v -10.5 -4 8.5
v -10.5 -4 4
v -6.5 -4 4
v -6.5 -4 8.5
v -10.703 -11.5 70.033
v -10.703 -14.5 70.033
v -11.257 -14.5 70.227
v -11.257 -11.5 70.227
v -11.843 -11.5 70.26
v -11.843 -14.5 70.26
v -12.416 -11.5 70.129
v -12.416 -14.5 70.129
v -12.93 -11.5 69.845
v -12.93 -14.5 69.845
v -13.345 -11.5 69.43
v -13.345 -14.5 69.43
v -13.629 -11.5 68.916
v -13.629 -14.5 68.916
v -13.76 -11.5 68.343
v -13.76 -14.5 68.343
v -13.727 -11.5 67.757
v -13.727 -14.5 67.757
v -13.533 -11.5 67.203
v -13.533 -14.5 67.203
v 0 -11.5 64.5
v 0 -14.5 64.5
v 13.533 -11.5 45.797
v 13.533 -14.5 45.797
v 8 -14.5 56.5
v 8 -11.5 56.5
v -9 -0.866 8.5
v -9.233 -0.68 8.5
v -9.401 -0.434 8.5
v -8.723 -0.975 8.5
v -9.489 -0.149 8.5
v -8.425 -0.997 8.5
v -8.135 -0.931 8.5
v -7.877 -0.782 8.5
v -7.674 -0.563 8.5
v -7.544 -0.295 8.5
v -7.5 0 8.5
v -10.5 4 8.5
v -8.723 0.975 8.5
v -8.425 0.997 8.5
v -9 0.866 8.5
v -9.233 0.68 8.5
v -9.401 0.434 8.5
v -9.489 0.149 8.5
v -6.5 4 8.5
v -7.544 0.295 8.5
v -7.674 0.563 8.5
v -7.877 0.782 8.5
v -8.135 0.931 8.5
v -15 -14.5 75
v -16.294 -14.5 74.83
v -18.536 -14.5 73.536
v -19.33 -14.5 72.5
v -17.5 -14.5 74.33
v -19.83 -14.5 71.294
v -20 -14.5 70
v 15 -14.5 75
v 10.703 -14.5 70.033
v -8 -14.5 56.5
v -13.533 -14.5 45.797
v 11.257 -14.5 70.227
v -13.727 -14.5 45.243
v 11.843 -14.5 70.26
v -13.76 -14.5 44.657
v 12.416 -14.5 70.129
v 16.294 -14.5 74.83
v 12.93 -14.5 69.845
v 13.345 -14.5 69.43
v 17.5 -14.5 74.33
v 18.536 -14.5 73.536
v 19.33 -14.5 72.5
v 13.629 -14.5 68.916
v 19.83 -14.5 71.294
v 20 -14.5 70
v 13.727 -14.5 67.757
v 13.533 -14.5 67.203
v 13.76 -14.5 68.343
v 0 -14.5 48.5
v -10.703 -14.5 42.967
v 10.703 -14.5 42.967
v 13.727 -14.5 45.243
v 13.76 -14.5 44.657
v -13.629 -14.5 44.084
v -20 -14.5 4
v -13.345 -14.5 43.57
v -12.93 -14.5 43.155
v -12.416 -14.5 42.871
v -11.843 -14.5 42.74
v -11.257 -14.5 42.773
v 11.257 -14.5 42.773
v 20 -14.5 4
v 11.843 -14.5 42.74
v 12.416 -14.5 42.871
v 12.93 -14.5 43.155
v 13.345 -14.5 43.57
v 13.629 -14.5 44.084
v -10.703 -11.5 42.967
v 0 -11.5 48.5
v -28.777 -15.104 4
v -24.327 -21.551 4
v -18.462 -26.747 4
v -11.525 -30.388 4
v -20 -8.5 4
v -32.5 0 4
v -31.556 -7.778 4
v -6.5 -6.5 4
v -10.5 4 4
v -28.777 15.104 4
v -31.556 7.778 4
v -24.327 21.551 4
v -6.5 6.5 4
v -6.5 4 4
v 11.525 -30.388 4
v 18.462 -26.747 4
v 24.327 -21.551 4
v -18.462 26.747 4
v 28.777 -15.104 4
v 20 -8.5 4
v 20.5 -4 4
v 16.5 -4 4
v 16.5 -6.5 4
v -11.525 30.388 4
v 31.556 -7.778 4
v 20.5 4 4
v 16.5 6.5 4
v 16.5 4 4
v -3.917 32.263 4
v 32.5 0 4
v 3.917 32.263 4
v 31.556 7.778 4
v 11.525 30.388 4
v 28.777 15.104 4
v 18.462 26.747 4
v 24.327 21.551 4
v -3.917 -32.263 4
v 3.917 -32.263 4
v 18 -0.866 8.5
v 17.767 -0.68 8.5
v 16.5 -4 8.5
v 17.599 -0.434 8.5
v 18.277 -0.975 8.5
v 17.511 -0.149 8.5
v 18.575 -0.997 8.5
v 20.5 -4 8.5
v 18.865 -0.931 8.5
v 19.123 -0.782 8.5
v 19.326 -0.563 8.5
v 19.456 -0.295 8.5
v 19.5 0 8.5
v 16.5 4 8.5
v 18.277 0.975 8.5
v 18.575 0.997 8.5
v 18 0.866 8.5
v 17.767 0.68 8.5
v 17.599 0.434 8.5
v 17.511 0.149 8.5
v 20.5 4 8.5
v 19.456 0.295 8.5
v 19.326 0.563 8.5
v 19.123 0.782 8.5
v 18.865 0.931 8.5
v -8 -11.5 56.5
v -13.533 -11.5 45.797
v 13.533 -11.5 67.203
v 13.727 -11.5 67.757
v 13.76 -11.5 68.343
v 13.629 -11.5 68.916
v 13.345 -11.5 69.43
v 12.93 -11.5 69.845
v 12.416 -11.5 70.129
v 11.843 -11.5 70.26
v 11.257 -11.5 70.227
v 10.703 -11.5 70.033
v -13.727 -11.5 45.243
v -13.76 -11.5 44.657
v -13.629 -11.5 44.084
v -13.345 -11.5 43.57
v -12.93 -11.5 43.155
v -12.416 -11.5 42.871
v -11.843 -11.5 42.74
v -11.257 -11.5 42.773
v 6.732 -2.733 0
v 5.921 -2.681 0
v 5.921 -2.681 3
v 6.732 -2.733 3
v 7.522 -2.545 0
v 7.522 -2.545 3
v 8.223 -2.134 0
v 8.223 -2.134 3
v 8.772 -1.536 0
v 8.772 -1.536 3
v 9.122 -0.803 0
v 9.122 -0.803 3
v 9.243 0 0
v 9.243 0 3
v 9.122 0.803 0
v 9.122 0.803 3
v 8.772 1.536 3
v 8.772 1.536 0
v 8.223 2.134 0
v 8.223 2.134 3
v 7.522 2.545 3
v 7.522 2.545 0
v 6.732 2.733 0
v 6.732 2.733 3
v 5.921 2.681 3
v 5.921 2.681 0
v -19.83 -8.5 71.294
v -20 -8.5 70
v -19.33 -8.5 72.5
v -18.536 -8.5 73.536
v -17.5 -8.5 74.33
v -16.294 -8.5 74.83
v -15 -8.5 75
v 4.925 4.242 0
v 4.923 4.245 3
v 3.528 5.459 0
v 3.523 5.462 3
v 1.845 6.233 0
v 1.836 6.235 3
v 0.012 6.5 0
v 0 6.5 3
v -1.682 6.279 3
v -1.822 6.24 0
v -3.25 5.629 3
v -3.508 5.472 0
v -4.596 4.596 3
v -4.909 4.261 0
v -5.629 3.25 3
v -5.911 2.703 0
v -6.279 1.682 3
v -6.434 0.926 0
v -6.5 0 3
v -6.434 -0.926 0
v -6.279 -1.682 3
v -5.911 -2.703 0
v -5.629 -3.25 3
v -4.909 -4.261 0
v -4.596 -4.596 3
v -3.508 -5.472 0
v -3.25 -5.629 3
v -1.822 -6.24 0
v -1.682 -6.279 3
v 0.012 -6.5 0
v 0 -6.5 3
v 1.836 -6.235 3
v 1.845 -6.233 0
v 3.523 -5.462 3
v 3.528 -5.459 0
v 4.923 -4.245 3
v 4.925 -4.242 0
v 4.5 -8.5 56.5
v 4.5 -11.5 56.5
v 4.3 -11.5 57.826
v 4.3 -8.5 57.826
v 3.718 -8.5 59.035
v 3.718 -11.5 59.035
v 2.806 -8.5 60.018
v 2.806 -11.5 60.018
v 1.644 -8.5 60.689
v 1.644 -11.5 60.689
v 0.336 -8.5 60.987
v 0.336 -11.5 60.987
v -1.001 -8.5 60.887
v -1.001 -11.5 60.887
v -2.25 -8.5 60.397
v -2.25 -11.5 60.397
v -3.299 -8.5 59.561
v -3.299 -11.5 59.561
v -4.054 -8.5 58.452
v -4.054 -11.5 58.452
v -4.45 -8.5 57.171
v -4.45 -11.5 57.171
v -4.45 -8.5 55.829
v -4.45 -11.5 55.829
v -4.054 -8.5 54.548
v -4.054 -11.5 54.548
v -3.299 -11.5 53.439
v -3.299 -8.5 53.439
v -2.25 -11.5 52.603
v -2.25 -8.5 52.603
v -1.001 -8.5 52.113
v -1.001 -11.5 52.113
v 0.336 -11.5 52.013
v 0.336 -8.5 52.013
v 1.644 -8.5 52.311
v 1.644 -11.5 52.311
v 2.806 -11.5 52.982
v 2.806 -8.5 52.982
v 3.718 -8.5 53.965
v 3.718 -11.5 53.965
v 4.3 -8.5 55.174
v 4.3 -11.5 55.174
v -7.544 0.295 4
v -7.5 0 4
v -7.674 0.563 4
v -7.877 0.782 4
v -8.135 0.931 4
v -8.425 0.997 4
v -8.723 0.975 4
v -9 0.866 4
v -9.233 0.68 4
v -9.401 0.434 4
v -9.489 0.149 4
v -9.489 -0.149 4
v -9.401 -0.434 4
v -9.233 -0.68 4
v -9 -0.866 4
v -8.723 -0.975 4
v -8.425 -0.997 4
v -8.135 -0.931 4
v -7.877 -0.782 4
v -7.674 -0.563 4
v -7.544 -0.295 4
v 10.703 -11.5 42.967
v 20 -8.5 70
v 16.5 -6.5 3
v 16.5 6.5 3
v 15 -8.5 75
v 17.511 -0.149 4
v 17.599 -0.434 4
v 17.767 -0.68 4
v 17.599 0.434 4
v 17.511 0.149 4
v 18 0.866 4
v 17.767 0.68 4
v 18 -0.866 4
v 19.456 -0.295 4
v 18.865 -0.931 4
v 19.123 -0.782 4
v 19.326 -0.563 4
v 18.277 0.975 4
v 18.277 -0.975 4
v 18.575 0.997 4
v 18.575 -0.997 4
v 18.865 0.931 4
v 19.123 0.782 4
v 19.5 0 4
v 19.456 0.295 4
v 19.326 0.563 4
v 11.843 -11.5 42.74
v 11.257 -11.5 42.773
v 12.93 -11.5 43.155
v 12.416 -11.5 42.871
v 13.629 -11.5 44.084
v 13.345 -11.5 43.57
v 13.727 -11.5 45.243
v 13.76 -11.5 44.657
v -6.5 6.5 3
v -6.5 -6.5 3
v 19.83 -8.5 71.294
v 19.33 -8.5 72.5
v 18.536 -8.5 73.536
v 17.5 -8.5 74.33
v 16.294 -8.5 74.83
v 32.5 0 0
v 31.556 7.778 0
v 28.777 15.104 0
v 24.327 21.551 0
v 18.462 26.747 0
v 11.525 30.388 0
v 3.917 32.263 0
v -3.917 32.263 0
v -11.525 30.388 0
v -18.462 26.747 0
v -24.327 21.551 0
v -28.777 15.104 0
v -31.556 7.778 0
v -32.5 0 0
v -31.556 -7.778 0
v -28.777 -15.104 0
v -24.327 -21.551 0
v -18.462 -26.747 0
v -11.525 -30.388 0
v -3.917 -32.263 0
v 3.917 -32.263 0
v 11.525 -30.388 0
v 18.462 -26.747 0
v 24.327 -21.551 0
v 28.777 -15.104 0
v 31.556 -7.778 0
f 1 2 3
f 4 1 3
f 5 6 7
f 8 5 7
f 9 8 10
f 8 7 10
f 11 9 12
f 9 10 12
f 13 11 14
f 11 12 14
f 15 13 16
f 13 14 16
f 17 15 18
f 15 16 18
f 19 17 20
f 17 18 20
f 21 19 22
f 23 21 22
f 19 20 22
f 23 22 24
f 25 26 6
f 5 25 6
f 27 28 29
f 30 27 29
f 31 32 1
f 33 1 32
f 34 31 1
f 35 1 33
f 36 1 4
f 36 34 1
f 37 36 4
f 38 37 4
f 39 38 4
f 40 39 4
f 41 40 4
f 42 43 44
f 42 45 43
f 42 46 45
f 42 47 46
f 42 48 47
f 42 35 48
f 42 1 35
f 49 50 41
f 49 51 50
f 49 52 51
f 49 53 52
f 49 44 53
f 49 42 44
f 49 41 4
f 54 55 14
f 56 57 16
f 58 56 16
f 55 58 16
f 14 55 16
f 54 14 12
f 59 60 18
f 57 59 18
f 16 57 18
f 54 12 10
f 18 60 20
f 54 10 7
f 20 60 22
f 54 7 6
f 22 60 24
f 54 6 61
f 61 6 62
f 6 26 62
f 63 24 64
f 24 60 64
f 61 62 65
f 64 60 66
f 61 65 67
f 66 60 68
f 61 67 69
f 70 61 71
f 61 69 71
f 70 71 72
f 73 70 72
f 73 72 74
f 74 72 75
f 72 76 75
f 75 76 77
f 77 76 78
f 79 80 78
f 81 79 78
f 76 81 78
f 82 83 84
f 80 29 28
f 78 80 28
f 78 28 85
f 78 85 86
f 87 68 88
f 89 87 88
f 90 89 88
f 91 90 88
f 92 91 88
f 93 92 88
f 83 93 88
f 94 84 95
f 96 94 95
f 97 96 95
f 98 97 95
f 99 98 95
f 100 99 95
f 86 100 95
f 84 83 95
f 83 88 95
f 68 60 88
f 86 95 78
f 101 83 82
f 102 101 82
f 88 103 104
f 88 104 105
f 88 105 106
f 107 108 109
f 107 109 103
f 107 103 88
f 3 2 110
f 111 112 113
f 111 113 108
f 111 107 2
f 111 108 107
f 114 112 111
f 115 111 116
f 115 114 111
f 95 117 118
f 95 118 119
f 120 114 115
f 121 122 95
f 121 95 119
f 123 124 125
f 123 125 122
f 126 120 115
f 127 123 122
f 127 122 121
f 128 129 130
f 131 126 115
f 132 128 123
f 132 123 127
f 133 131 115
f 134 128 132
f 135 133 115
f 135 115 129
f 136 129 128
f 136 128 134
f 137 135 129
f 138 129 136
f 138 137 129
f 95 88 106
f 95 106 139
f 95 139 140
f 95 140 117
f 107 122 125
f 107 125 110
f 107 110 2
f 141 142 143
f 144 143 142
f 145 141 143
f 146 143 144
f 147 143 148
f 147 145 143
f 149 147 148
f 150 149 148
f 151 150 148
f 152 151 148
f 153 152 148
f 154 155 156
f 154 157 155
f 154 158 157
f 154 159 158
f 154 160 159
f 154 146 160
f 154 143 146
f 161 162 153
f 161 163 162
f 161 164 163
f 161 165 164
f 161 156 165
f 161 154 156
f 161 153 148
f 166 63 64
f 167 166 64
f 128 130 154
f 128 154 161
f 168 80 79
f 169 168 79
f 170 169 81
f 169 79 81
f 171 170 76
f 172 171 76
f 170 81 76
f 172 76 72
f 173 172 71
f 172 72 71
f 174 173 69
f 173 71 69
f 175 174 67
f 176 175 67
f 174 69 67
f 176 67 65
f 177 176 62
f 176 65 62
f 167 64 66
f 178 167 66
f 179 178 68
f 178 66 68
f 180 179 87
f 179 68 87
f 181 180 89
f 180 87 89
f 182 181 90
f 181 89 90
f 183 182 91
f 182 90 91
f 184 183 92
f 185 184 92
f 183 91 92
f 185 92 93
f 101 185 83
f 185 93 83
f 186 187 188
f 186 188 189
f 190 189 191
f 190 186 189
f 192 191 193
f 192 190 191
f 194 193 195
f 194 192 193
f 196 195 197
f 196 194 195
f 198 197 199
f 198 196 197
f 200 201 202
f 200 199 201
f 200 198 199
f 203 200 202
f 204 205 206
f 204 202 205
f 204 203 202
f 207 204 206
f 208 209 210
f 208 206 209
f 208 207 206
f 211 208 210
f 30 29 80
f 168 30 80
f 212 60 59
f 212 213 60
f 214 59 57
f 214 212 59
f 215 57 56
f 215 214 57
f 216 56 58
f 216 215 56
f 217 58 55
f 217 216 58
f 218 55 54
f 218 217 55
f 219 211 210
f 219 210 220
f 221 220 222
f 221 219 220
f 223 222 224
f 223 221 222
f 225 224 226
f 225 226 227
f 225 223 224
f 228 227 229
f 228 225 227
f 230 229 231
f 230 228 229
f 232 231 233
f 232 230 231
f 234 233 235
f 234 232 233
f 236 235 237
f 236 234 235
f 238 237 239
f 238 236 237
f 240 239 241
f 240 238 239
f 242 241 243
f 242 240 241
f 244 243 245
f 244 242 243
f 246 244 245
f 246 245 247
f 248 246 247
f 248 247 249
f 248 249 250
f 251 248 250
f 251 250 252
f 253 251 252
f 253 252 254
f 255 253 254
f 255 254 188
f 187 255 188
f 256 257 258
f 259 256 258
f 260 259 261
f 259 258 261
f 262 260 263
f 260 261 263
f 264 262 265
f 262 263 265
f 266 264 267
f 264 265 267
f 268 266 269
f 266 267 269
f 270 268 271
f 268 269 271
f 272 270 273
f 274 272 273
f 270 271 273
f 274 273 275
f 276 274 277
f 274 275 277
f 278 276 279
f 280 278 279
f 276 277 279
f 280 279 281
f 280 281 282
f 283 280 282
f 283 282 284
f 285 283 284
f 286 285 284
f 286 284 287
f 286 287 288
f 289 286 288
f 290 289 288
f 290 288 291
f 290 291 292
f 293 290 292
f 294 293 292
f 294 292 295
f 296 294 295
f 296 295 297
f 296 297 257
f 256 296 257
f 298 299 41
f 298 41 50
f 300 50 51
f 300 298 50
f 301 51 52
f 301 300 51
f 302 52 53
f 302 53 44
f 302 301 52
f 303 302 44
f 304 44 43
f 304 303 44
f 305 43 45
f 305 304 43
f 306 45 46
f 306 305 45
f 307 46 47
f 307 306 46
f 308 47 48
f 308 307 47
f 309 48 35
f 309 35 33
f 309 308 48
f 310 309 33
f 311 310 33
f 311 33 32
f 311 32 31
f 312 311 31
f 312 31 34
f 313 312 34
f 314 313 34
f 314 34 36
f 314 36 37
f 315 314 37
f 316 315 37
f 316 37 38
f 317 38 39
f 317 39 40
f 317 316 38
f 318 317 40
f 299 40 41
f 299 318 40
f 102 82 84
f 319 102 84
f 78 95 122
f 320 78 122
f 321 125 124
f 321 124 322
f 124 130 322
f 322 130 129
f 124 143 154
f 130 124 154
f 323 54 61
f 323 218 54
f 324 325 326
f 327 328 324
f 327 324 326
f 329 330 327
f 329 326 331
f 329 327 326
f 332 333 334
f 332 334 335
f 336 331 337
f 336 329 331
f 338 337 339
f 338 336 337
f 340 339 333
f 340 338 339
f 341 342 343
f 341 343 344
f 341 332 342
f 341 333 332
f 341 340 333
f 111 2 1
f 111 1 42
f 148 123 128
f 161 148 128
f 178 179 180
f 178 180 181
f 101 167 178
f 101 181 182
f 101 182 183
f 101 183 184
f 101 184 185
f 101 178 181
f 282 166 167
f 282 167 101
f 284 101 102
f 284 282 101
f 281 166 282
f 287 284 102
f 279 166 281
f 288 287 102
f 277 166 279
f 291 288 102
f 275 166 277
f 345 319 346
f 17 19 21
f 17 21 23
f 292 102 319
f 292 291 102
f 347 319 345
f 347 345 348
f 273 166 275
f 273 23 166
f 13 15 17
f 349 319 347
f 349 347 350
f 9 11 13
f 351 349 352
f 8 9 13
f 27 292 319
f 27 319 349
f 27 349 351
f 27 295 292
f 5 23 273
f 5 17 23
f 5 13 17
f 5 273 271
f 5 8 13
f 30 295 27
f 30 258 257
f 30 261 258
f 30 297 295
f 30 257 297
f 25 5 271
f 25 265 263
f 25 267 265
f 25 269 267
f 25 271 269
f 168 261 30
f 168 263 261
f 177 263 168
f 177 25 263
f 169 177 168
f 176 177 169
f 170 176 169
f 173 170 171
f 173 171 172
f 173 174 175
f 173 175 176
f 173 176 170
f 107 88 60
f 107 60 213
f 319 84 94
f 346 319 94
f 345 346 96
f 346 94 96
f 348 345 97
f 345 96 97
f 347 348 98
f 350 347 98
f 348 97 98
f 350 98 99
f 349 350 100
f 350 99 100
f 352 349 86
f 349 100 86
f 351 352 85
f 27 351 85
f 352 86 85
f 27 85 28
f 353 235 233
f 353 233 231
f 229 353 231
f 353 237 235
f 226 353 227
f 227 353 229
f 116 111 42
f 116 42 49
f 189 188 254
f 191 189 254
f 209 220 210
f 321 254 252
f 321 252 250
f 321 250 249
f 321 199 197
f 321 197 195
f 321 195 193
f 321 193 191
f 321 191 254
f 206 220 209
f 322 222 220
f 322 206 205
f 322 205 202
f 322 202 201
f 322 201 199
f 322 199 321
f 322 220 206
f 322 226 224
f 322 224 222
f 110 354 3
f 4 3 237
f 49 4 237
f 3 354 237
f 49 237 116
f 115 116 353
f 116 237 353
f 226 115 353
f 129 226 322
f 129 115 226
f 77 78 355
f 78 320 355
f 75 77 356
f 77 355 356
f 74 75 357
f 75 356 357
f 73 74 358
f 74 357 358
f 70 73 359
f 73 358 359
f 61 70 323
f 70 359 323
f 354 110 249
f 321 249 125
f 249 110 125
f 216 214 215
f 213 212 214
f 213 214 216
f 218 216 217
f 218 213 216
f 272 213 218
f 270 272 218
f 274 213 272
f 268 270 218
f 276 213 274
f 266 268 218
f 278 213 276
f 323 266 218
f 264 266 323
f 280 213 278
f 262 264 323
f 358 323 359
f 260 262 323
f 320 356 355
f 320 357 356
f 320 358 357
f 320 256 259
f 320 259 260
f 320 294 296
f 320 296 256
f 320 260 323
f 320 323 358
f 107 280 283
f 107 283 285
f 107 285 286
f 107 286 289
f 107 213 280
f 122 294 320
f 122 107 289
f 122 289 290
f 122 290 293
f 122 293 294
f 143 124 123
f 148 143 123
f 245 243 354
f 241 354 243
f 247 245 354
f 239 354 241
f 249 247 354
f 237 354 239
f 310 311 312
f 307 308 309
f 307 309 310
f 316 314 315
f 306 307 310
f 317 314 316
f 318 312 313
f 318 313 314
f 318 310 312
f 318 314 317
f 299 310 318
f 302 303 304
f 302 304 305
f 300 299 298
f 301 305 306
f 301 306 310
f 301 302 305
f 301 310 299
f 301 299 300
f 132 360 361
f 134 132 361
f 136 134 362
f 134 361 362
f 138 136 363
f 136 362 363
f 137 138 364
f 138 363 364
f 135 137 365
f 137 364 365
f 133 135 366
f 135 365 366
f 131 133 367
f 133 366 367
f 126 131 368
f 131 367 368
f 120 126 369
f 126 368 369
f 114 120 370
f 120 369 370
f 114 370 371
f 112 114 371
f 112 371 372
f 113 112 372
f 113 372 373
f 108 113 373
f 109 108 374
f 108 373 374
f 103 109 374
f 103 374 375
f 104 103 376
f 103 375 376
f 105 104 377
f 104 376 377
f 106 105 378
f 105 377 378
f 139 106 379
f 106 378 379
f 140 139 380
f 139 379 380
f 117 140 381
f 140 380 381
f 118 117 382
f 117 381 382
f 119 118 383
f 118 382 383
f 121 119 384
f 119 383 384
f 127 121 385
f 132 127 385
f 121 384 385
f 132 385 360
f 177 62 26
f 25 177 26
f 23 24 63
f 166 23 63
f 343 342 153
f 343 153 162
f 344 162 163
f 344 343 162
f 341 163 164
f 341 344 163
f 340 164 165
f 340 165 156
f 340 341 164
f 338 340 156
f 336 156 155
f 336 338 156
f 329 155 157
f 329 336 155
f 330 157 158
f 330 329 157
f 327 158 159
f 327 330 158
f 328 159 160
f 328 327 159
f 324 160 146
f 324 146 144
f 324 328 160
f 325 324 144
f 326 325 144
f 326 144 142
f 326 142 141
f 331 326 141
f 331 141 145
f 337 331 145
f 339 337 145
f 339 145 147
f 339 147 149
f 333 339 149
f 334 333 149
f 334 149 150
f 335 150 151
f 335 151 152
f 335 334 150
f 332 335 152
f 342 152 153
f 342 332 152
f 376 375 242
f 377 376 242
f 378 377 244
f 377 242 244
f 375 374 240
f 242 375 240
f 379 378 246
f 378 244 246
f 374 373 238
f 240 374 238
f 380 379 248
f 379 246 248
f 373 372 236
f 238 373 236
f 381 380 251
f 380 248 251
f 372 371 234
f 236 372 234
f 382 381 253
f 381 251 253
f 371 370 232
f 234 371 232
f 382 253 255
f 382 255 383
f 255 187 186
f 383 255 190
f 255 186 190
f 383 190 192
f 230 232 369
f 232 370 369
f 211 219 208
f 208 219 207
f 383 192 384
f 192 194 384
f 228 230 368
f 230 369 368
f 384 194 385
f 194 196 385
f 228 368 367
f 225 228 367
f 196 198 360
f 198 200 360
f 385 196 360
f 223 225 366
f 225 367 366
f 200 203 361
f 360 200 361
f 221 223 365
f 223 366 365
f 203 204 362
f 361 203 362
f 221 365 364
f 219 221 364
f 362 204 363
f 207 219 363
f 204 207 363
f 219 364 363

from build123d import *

# Parameters (mm, degrees)
ESBO_O1_R                = 32.5
RESSALTO_EXTRUS_O1_DEPTH = 4
ESBO_O2_W                = 4
ESBO_O2_H                = 8
ESBO_O2_R                = 1
RESSALTO_EXTRUS_O3_DEPTH = 4.5
ESBO_O3_W                = 23
ESBO_O3_H                = 13
CORTE_EXTRUS_O1_DEPTH    = 1
ESBO_O4_W                = 40
ESBO_O4_H                = 6
RESSALTO_EXTRUS_O4_DEPTH = 71
ESBO_O5_R                = 4.5
CORTE_EXTRUS_O2_DEPTH    = 61
CORTE_EXTRUS_O3_DEPTH    = 3
FILETE1_R                = 5


with BuildPart() as part:
    # Esboço1 → Ressalto-extrusão1 (new body)
    with BuildSketch(Plane.XY):
        Circle(ESBO_O1_R)
        with BuildLine():
            ThreePointArc((5.921389022, 2.680886429), (-6.5, 0), (5.921389022, -2.680886429))
            ThreePointArc((5.921389022, -2.680886429), (9.242616034, 0), (5.921389022, 2.680886429))
        make_face(mode=Mode.SUBTRACT)
    extrude(amount=RESSALTO_EXTRUS_O1_DEPTH)

    # Esboço2 → Ressalto-extrusão3 (add)
    with BuildSketch(Plane.XY.offset(4)):
        with Locations((-8.5, 0)):
            Rectangle(ESBO_O2_W, ESBO_O2_H)
        with Locations((-8.5, 0)):
            Circle(ESBO_O2_R, mode=Mode.SUBTRACT)
        with Locations((18.5, 0)):
            Rectangle(ESBO_O2_W, ESBO_O2_H)
        with Locations((18.5, 0)):
            Circle(ESBO_O2_R, mode=Mode.SUBTRACT)
    extrude(amount=RESSALTO_EXTRUS_O3_DEPTH)

    # Esboço3 → Corte-extrusão1 (cut)
    with BuildSketch(Plane.XY.offset(4)):
        with Locations((5, 0)):
            Rectangle(ESBO_O3_W, ESBO_O3_H)
    extrude(amount=-CORTE_EXTRUS_O1_DEPTH, mode=Mode.SUBTRACT)

    # Esboço4 → Ressalto-extrusão4 (add)
    with BuildSketch(Plane.XY.offset(4)):
        with Locations((0, -11.5)):
            Rectangle(ESBO_O4_W, ESBO_O4_H)
    extrude(amount=RESSALTO_EXTRUS_O4_DEPTH)

    # Esboço5 → Corte-extrusão2 (cut)
    with BuildSketch(Plane.XZ.offset(14.5)):
        with Locations((0, 56.5)):
            Circle(ESBO_O5_R)
    extrude(amount=-CORTE_EXTRUS_O2_DEPTH, mode=Mode.SUBTRACT)

    # Esboço6 → Corte-extrusão3 (cut)
    with BuildSketch(Plane.XZ.offset(14.5)):
        with BuildLine():
            Line((0, 64.5), (-10.70310615, 70.032504242))
            ThreePointArc((-10.70310615, 70.032504242), (-13.151971512, 69.651971512), (-13.532504242, 67.20310615))
            Line((-13.532504242, 67.20310615), (-8, 56.5))
            Line((-8, 56.5), (-13.532504242, 45.79689385))
            ThreePointArc((-13.532504242, 45.79689385), (-13.151971512, 43.348028488), (-10.70310615, 42.967495758))
            Line((-10.70310615, 42.967495758), (0, 48.5))
            Line((0, 48.5), (10.70310615, 42.967495758))
            ThreePointArc((10.70310615, 42.967495758), (13.151971512, 43.348028488), (13.532504242, 45.79689385))
            Line((13.532504242, 45.79689385), (8, 56.5))
            Line((8, 56.5), (13.532504242, 67.20310615))
            ThreePointArc((13.532504242, 67.20310615), (13.151971512, 69.651971512), (10.70310615, 70.032504242))
            Line((10.70310615, 70.032504242), (0, 64.5))
        make_face()
    extrude(amount=-CORTE_EXTRUS_O3_DEPTH, mode=Mode.SUBTRACT)

    # Filete1
    filete1_edges = [part.edges().sort_by_distance(p)[0] for p in [
        (20, -11.5, 75),
        (-20, -11.5, 75),
    ]]
    fillet(filete1_edges, radius=FILETE1_R)


solid = part.part
